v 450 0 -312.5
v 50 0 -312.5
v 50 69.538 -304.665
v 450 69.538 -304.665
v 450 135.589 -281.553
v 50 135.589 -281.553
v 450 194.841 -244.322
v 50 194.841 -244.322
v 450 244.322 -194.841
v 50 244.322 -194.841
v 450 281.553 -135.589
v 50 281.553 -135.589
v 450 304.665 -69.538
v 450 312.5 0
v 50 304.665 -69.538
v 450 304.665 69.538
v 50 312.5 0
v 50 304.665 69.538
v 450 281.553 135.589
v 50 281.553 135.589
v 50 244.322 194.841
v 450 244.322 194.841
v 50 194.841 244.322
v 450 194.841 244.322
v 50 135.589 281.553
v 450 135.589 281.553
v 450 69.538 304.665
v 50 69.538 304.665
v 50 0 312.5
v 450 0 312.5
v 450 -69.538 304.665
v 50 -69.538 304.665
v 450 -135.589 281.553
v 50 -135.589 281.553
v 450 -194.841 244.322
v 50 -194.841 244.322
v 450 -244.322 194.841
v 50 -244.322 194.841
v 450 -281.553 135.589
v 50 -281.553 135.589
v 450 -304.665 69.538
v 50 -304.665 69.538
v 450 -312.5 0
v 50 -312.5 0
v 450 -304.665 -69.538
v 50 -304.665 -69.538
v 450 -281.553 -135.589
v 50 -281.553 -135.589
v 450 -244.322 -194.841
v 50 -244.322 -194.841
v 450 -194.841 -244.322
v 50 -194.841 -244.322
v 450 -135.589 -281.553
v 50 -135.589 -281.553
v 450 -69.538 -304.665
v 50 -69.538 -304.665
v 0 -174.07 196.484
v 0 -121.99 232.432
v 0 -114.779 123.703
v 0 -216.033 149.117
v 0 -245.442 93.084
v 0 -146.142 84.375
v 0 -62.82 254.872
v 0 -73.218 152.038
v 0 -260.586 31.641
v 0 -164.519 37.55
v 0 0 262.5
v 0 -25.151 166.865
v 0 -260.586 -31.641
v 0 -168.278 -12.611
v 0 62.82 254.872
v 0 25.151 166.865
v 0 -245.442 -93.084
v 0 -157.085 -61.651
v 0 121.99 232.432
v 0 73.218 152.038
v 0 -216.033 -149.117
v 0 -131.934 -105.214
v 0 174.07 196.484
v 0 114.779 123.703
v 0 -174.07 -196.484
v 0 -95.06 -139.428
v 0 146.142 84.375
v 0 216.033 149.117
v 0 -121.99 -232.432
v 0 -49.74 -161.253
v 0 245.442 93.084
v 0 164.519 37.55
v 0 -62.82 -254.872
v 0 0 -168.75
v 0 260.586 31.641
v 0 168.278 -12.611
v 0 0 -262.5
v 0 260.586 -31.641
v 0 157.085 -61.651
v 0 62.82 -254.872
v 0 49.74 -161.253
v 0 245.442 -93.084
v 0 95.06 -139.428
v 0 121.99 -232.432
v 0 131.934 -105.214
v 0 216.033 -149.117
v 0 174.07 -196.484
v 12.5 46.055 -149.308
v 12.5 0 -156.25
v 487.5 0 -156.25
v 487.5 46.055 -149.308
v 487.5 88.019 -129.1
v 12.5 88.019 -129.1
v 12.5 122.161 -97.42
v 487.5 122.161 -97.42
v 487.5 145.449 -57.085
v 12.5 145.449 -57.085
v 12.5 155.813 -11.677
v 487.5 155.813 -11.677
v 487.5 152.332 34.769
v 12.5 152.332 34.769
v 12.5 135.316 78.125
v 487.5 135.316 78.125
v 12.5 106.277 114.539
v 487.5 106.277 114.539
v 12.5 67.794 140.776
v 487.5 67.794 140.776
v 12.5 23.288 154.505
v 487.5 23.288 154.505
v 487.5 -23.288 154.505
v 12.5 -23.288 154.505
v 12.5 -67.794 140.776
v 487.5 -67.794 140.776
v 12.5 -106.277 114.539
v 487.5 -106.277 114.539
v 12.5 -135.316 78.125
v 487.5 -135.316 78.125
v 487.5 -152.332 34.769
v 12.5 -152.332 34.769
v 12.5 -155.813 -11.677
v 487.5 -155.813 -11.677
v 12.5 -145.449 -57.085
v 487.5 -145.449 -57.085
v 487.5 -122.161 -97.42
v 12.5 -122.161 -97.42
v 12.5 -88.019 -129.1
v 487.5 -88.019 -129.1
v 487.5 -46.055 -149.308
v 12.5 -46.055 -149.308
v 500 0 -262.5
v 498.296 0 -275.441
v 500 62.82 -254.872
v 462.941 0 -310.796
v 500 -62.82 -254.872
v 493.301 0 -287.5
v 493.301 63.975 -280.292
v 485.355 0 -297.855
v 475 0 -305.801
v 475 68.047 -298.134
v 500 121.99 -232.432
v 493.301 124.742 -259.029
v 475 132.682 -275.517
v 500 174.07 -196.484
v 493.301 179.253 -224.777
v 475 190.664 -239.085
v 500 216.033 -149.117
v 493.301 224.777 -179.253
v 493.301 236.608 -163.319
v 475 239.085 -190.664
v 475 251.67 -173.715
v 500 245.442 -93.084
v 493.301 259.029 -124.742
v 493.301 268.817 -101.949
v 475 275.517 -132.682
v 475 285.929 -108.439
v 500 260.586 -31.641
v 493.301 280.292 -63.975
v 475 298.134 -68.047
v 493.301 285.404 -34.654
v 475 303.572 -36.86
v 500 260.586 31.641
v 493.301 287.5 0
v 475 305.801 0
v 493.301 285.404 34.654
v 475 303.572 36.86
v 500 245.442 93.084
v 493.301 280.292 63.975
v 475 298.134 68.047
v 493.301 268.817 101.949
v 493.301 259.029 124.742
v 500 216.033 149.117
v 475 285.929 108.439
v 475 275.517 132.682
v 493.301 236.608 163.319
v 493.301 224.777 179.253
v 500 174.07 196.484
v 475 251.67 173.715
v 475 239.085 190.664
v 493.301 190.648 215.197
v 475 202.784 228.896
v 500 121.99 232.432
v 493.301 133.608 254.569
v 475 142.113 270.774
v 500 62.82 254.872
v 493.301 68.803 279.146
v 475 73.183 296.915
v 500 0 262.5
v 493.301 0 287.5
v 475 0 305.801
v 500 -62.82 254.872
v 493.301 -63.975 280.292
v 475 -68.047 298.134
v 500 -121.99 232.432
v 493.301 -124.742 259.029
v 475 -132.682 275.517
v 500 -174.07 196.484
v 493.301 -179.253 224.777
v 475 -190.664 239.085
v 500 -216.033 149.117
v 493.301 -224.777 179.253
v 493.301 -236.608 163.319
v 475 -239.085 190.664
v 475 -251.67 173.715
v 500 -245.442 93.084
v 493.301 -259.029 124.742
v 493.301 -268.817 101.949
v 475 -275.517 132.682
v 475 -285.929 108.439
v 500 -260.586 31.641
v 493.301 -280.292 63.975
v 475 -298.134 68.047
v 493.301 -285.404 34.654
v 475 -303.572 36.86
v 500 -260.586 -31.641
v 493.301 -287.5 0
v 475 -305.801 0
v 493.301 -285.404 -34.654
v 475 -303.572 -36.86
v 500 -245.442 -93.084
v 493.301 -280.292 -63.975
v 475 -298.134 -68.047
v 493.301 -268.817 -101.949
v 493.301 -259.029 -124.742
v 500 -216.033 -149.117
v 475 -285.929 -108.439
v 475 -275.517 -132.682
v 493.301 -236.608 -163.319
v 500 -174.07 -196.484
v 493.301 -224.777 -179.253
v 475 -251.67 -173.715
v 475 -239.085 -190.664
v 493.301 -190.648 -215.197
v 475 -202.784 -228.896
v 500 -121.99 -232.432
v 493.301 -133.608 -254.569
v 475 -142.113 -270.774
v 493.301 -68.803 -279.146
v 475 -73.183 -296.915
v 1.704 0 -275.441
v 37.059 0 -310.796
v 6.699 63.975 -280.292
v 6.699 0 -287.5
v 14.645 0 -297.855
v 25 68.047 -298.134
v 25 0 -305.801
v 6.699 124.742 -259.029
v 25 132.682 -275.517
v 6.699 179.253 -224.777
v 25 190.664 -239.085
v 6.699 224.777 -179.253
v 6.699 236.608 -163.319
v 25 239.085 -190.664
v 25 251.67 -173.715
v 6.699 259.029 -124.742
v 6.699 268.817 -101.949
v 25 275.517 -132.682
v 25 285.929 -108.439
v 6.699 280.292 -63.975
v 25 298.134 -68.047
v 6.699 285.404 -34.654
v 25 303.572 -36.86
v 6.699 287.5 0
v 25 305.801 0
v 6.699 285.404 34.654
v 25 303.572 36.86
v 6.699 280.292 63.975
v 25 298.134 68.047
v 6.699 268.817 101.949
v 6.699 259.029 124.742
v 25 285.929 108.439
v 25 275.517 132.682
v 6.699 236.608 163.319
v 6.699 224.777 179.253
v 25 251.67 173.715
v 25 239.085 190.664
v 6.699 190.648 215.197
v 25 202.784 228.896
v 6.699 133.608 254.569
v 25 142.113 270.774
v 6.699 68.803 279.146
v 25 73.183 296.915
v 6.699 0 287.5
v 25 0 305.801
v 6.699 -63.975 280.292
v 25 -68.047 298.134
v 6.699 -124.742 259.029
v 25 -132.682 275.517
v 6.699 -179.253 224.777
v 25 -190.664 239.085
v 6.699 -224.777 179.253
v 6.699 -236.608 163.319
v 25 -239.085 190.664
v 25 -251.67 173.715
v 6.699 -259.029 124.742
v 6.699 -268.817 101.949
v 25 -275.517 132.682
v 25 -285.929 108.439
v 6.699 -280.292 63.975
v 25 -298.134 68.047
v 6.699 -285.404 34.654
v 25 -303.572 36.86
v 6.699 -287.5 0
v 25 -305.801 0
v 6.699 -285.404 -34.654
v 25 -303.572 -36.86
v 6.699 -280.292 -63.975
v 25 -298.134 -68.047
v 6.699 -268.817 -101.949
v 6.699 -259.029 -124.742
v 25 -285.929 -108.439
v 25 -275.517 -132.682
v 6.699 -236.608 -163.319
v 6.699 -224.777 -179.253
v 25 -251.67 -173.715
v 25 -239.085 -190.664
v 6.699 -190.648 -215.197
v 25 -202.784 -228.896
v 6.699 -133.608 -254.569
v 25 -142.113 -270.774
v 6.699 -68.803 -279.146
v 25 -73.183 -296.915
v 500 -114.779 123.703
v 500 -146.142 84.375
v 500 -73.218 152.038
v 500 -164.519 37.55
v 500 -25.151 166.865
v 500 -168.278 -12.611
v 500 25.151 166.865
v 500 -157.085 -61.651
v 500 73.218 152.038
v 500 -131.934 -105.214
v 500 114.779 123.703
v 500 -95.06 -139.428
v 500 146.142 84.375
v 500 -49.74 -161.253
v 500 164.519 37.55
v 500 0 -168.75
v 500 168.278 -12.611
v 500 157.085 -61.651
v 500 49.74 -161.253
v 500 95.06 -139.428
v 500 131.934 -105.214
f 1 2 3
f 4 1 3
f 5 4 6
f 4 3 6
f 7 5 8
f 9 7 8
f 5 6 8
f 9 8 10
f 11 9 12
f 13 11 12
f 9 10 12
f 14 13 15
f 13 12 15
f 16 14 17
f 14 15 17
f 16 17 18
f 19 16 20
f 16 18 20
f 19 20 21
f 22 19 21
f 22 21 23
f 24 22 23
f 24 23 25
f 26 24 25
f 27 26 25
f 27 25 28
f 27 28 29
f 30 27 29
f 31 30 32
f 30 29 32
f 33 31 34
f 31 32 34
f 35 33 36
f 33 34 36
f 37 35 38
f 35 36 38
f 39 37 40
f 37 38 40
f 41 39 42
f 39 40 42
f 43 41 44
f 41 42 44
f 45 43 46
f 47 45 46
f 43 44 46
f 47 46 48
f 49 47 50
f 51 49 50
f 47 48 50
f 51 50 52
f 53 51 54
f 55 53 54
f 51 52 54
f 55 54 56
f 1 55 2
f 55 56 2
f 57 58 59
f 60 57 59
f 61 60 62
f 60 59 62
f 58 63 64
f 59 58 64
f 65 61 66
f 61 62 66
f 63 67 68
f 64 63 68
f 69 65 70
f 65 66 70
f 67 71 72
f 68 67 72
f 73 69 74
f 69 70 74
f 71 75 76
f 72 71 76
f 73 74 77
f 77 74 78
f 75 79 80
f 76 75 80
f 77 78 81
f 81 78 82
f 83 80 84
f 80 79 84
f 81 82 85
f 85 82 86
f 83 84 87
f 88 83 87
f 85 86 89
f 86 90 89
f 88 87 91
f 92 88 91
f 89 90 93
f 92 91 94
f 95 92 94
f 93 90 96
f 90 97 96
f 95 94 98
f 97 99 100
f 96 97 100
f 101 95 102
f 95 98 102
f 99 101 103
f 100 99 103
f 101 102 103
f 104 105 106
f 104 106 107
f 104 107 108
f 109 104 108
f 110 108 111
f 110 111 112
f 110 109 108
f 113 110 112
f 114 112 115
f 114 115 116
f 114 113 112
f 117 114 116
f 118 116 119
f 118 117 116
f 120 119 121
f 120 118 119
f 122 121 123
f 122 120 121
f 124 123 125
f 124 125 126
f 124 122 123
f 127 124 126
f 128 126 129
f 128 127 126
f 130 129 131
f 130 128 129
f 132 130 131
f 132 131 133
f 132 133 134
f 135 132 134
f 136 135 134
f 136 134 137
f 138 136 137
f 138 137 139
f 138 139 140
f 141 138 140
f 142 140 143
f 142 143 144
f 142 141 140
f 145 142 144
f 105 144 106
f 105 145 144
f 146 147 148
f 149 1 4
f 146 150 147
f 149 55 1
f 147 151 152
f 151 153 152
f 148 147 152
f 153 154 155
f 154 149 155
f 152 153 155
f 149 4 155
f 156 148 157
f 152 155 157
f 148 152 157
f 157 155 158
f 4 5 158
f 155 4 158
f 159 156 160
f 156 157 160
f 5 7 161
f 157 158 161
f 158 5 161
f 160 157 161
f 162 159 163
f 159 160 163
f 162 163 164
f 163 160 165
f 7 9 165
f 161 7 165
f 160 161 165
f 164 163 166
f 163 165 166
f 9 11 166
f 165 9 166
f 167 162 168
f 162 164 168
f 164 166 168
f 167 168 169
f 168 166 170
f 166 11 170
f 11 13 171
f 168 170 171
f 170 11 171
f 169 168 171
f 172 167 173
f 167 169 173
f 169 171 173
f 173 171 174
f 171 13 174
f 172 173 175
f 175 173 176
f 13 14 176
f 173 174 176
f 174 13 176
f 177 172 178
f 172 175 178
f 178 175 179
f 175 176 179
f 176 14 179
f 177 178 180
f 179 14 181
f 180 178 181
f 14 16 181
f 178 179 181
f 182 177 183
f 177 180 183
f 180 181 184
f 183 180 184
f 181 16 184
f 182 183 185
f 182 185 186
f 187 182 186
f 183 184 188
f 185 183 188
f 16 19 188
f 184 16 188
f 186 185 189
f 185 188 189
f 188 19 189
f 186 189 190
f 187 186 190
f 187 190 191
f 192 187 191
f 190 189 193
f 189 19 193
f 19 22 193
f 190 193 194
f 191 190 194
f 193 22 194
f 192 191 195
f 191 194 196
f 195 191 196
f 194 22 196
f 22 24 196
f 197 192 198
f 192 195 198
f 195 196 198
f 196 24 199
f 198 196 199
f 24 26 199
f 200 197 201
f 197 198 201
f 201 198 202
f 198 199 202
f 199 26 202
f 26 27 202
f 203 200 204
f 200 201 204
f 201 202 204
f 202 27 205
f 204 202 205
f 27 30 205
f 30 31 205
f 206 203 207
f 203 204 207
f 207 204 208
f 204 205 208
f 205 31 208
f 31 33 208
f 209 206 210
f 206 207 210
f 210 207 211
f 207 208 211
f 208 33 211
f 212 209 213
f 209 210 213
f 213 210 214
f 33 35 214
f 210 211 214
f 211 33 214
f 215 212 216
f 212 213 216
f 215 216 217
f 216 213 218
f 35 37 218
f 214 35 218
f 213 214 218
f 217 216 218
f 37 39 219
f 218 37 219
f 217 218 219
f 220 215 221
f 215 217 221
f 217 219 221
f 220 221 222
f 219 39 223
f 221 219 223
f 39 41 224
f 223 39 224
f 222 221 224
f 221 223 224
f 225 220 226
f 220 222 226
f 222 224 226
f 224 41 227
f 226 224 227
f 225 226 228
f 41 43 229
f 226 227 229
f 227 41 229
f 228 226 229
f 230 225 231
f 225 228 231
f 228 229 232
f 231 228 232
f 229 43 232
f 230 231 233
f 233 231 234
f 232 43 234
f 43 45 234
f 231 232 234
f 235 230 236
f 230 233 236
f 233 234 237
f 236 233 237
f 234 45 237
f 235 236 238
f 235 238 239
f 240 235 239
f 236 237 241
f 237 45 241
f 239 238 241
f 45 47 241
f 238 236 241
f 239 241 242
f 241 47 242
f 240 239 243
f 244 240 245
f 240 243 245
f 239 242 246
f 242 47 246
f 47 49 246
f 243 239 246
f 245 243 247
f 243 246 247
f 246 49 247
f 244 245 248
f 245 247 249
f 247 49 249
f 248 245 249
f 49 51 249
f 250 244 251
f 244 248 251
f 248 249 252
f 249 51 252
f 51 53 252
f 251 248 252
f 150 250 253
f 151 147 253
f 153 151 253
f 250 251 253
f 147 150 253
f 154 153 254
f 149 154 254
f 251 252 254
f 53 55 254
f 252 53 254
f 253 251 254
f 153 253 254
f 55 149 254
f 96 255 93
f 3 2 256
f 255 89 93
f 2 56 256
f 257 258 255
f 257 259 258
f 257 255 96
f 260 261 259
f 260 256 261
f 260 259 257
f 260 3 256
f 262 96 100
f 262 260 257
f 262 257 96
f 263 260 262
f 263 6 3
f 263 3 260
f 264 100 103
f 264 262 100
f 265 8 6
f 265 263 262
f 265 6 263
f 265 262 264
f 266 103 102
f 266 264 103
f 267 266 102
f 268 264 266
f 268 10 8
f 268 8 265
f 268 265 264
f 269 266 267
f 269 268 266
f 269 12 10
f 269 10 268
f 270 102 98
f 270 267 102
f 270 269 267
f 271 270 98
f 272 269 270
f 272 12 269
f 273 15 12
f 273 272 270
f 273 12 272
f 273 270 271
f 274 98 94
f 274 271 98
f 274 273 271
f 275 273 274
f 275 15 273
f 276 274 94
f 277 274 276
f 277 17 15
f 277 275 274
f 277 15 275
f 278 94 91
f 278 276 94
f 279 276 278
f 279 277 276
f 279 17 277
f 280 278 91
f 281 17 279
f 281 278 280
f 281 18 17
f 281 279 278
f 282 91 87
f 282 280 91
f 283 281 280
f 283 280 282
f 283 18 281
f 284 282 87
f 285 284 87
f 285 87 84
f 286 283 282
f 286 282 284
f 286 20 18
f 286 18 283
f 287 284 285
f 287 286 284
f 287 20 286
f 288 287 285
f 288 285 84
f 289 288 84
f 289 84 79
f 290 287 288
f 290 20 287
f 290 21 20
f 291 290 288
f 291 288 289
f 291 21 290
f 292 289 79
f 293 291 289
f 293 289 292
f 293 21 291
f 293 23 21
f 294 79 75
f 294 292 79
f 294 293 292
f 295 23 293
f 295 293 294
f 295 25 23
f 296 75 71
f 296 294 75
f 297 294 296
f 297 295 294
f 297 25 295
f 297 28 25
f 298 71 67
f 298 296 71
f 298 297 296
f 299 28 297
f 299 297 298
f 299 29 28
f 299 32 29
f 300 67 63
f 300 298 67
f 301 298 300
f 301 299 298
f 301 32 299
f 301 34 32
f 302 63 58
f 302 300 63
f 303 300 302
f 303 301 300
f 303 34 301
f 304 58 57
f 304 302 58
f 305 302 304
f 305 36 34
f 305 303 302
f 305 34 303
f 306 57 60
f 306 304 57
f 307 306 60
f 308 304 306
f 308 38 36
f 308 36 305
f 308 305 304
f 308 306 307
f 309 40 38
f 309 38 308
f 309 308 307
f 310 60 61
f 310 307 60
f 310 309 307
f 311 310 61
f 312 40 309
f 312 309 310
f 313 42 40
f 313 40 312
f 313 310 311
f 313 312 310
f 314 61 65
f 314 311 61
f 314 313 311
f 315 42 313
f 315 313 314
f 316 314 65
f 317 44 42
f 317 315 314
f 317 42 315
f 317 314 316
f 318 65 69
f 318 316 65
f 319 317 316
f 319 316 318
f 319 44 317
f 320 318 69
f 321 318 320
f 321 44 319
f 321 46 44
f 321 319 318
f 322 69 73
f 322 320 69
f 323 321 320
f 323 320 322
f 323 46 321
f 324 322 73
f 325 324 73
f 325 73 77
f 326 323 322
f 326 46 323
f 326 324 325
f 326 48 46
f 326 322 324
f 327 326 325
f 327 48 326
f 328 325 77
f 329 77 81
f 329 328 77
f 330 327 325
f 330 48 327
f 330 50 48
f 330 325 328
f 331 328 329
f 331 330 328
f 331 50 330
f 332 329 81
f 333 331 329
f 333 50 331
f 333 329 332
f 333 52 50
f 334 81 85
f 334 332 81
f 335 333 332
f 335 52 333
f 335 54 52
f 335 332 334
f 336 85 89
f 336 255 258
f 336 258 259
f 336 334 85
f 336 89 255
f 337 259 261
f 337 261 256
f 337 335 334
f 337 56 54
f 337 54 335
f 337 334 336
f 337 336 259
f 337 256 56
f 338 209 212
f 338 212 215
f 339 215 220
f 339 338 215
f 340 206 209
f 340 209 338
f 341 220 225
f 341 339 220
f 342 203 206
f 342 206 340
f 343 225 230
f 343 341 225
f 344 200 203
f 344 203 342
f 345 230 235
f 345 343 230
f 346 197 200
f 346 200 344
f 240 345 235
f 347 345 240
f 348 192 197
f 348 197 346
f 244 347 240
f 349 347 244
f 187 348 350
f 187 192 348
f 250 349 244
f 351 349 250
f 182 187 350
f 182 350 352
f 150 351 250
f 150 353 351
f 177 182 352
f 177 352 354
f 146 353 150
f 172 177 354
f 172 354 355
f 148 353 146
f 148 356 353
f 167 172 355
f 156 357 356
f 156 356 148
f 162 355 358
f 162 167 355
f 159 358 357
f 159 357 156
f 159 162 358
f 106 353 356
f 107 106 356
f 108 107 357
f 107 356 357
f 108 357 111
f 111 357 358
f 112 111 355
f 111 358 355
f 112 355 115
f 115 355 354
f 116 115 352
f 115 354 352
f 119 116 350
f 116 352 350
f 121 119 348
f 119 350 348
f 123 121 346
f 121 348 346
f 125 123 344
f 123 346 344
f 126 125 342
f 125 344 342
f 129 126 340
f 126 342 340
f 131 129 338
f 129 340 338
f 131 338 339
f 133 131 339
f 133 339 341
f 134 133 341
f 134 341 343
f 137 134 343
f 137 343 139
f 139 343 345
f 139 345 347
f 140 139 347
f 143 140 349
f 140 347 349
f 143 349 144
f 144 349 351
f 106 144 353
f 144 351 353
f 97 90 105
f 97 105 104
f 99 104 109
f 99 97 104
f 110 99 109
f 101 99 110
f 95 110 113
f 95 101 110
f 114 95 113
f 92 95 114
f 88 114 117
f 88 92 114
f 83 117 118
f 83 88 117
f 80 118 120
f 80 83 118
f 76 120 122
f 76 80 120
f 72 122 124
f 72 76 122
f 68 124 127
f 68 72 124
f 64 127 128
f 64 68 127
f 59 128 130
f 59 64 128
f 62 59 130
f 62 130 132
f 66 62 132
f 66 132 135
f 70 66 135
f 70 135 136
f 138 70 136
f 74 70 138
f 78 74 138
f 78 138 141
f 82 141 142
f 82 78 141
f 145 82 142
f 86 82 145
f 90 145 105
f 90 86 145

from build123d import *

# Parameters (mm, degrees)
SKETCH1_R           = 312.5
SKETCH1_R_2         = 156.25
BOSS_EXTRUDE1_DEPTH = 500
CHAMFER1_SIZE       = 12.5
FILLET1_R           = 50


with BuildPart() as part:
    # Sketch1 → Boss-Extrude1 (new body)
    with BuildSketch(Plane(origin=(0, 0, 0), x_dir=(0, 0, -1), z_dir=(1, 0, 0))):
        Circle(SKETCH1_R)
        Circle(SKETCH1_R_2, mode=Mode.SUBTRACT)
    extrude(amount=BOSS_EXTRUDE1_DEPTH)

    # Chamfer1
    chamfer1_edges = [part.edges().sort_by_distance(p)[0] for p in [
        (0, 0, 156.25),
        (500, 0, 156.25),
    ]]
    chamfer(chamfer1_edges, length=CHAMFER1_SIZE)

    # Fillet1
    fillet1_edges = [part.edges().sort_by_distance(p)[0] for p in [
        (0, 0, 312.5),
        (500, 0, 312.5),
    ]]
    fillet(fillet1_edges, radius=FILLET1_R)


solid = part.part
